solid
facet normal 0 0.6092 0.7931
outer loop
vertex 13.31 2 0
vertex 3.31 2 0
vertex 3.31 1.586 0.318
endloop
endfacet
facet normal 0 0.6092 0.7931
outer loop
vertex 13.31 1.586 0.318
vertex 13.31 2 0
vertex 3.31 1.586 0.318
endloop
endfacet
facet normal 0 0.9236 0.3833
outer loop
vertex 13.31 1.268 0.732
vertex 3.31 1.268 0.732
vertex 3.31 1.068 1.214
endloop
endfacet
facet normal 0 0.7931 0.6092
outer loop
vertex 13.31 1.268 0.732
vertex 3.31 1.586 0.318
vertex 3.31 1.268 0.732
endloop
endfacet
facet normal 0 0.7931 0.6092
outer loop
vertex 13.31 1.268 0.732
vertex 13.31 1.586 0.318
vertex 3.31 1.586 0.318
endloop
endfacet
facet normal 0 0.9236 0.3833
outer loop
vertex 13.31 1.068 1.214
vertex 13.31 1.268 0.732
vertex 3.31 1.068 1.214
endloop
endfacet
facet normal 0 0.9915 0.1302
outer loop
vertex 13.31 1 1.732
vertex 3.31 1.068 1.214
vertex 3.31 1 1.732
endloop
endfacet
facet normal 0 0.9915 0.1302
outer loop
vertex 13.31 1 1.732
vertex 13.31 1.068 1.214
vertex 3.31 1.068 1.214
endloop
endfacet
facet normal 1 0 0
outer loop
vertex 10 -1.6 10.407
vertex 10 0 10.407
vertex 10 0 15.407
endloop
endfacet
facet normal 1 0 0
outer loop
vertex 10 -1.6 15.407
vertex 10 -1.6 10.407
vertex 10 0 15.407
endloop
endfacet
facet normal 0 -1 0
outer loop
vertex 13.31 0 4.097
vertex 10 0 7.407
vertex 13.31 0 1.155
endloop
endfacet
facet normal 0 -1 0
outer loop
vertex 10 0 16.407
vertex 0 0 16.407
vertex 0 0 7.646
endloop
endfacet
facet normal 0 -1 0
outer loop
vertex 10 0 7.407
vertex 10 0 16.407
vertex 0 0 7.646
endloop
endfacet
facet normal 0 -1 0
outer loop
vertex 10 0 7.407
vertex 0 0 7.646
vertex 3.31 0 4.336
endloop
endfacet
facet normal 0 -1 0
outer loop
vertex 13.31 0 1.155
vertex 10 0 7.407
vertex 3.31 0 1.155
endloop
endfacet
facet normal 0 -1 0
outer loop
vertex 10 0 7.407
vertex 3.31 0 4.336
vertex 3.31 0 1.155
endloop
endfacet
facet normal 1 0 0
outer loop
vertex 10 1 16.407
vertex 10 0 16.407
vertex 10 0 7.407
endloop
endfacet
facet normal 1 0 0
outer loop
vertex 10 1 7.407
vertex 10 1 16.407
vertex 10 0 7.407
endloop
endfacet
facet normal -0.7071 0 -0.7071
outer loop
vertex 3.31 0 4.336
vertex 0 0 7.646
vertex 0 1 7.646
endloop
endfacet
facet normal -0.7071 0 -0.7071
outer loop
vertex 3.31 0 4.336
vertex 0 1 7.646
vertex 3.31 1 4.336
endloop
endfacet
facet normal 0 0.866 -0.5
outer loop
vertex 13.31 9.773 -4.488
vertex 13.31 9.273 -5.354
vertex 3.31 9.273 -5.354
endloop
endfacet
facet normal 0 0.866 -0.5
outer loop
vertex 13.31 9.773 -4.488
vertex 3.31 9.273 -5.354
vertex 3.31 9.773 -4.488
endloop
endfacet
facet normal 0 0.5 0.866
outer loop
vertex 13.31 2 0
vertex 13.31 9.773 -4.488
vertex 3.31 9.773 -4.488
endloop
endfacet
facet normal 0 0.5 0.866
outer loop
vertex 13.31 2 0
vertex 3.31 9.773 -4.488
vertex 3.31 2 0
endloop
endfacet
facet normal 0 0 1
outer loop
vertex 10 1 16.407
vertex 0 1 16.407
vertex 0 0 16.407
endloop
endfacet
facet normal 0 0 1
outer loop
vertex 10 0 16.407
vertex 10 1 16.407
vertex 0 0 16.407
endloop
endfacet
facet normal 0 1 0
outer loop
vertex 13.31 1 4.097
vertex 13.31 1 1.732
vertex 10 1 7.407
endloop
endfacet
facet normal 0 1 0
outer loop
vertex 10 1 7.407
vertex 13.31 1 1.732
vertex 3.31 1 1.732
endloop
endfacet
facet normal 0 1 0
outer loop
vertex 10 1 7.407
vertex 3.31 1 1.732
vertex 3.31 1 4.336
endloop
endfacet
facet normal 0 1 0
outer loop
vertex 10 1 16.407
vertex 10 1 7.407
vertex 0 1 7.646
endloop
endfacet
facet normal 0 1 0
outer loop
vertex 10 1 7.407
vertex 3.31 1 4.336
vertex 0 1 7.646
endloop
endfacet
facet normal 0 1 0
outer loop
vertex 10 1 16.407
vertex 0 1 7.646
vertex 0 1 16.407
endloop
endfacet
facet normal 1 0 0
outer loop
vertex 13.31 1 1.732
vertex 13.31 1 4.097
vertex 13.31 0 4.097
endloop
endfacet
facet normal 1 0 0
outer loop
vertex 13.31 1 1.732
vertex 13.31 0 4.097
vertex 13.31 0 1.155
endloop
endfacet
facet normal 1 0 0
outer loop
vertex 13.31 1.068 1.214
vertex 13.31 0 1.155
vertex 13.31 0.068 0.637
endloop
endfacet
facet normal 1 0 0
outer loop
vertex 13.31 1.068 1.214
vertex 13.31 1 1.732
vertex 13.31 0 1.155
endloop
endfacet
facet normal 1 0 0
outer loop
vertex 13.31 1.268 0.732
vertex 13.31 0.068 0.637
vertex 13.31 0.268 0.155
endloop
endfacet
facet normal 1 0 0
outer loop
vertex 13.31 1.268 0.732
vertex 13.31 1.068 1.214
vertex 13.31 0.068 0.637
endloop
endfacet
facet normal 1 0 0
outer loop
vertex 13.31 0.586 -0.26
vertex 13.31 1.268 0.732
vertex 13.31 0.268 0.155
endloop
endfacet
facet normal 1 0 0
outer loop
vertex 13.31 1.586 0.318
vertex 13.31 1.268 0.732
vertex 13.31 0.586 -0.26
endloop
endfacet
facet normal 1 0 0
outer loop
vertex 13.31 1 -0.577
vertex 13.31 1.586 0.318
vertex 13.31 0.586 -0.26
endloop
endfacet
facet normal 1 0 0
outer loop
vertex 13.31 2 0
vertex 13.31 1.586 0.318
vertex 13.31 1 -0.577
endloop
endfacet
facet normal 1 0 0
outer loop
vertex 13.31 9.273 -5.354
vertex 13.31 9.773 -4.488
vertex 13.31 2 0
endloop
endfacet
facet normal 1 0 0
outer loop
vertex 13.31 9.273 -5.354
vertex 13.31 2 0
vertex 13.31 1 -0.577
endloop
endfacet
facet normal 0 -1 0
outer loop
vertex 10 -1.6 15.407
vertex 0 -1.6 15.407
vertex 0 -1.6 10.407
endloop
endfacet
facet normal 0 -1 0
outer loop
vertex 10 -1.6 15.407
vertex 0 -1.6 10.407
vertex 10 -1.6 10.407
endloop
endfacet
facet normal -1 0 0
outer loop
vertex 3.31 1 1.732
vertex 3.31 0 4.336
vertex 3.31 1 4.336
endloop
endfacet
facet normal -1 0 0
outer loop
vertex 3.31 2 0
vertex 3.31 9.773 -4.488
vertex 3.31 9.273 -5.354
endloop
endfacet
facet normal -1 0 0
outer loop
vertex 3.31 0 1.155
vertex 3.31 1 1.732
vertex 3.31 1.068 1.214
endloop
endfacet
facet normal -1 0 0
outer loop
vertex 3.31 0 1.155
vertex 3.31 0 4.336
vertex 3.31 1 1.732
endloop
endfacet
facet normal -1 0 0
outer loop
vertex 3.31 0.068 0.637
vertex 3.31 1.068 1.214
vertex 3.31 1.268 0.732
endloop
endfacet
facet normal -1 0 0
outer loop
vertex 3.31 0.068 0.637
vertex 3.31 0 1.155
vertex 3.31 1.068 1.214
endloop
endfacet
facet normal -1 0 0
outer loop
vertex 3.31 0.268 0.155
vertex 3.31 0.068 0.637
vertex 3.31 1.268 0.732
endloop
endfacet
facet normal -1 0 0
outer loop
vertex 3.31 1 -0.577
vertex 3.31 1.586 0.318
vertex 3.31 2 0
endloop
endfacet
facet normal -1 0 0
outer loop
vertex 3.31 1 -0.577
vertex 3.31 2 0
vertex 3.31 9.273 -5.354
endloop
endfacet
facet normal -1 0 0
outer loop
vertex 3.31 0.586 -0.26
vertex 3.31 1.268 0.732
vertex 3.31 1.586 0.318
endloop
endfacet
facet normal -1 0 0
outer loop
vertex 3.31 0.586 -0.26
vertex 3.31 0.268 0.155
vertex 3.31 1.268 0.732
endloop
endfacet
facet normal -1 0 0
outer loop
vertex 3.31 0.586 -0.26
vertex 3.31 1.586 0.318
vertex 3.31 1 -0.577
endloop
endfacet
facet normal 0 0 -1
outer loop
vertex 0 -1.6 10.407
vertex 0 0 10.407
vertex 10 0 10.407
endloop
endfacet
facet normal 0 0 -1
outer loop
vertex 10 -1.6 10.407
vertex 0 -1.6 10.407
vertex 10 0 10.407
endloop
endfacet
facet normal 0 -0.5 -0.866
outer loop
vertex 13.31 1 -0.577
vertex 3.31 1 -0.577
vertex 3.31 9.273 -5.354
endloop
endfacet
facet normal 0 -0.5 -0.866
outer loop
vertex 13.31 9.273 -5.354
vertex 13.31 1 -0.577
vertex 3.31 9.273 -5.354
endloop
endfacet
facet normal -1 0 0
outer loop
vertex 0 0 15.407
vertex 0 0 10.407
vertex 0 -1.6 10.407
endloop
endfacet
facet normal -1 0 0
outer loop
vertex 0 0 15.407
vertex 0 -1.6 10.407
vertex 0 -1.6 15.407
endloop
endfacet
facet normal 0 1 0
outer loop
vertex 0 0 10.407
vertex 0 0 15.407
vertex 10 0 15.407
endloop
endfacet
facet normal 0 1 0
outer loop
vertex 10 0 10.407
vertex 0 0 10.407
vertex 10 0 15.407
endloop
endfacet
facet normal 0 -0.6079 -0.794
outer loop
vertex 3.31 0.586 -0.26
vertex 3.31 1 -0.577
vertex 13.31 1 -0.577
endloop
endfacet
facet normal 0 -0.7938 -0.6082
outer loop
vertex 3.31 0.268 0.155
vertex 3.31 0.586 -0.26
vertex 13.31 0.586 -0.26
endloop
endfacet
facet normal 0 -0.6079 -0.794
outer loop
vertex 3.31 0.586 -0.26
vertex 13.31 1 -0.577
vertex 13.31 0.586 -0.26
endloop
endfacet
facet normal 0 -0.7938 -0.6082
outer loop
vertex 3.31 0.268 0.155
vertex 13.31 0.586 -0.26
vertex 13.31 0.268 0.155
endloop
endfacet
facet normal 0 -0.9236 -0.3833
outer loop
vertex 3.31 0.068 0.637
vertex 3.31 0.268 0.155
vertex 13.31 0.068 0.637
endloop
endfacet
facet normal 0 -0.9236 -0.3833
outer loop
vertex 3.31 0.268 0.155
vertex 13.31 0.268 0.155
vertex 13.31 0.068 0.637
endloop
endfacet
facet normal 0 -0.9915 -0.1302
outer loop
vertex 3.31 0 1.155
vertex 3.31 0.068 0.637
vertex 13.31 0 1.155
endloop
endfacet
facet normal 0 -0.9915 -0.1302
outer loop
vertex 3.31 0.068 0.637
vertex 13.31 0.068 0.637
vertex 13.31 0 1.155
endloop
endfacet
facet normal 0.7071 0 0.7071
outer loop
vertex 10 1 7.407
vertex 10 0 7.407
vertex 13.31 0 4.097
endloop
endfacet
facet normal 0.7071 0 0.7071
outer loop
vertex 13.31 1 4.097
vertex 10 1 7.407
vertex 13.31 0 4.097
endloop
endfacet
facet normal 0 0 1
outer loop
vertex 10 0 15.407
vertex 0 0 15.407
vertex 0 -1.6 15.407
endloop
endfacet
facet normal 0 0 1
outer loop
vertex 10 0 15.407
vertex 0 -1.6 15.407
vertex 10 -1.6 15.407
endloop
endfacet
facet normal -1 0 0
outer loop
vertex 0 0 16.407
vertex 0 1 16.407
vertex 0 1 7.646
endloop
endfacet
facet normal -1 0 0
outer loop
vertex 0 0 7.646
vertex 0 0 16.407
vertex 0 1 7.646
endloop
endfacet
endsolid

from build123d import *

# Parameters (mm, degrees)
BOSS_EXTRUDE1_DEPTH     = 13.31
CUT_EXTRUDE1_DEPTH      = 1
FILLET1_R               = 2
SKETCH4_W               = 10
SKETCH4_H               = 5
BOSS_EXTRUDE2_DEPTH     = 1.6
CUT_EXTRUDE2_DEPTH      = 10.773313421
CUT_EXTRUDE2_DEPTH_BACK = 2.6


with BuildPart() as part:
    # Sketch1 → Boss-Extrude1 (new body)
    with BuildSketch(Plane(origin=(0, 0, 0), x_dir=(0, 0, -1), z_dir=(1, 0, 0))):
        Polygon((4.487924596, 9.773313421), (-0.577350269, 1), (-16.4065524, 1), (-16.4065524, 0), (0, 0), (5.35395, 9.273313421), align=None)
    extrude(amount=BOSS_EXTRUDE1_DEPTH)

    # Sketch2 → Cut-Extrude1 (cut)
    with BuildSketch(Plane(origin=(0, 0, 0), x_dir=(1, 0, 0), z_dir=(0, 1, 0))):
        Polygon((13.31, -16.4065524), (10, -16.4065524), (10, -7.4065524), (13.31, -4.0965524), align=None)
    extrude(amount=CUT_EXTRUDE1_DEPTH, mode=Mode.SUBTRACT)

    # Fillet1
    fillet1_edges = [part.edges().sort_by_distance(p)[0] for p in [
        (6.655, 0, 0),
        (6.655, 1, 0.577350269),
    ]]
    fillet(fillet1_edges, radius=FILLET1_R)

    # Sketch5 → Cut-Extrude2 (cut, two sides)
    with BuildSketch(Plane(origin=(0, 0, 0), x_dir=(1, 0, 0), z_dir=(0, 1, 0))) as cut_extrude2_sk:
        Polygon((0, 5.35395), (0, -7.64605), (3.31, -4.33605), (3.31, 5.35395), align=None)
    extrude(amount=CUT_EXTRUDE2_DEPTH, mode=Mode.SUBTRACT)
    extrude(cut_extrude2_sk.sketch, amount=-CUT_EXTRUDE2_DEPTH_BACK, mode=Mode.SUBTRACT)


with BuildPart() as body_2:
    # Sketch4 → Boss-Extrude2 (new body)
    with BuildSketch(Plane.XZ):
        with Locations((5, 12.9065524)):
            Rectangle(SKETCH4_W, SKETCH4_H)
    extrude(amount=BOSS_EXTRUDE2_DEPTH)


solid = Compound([part.part, body_2.part])
